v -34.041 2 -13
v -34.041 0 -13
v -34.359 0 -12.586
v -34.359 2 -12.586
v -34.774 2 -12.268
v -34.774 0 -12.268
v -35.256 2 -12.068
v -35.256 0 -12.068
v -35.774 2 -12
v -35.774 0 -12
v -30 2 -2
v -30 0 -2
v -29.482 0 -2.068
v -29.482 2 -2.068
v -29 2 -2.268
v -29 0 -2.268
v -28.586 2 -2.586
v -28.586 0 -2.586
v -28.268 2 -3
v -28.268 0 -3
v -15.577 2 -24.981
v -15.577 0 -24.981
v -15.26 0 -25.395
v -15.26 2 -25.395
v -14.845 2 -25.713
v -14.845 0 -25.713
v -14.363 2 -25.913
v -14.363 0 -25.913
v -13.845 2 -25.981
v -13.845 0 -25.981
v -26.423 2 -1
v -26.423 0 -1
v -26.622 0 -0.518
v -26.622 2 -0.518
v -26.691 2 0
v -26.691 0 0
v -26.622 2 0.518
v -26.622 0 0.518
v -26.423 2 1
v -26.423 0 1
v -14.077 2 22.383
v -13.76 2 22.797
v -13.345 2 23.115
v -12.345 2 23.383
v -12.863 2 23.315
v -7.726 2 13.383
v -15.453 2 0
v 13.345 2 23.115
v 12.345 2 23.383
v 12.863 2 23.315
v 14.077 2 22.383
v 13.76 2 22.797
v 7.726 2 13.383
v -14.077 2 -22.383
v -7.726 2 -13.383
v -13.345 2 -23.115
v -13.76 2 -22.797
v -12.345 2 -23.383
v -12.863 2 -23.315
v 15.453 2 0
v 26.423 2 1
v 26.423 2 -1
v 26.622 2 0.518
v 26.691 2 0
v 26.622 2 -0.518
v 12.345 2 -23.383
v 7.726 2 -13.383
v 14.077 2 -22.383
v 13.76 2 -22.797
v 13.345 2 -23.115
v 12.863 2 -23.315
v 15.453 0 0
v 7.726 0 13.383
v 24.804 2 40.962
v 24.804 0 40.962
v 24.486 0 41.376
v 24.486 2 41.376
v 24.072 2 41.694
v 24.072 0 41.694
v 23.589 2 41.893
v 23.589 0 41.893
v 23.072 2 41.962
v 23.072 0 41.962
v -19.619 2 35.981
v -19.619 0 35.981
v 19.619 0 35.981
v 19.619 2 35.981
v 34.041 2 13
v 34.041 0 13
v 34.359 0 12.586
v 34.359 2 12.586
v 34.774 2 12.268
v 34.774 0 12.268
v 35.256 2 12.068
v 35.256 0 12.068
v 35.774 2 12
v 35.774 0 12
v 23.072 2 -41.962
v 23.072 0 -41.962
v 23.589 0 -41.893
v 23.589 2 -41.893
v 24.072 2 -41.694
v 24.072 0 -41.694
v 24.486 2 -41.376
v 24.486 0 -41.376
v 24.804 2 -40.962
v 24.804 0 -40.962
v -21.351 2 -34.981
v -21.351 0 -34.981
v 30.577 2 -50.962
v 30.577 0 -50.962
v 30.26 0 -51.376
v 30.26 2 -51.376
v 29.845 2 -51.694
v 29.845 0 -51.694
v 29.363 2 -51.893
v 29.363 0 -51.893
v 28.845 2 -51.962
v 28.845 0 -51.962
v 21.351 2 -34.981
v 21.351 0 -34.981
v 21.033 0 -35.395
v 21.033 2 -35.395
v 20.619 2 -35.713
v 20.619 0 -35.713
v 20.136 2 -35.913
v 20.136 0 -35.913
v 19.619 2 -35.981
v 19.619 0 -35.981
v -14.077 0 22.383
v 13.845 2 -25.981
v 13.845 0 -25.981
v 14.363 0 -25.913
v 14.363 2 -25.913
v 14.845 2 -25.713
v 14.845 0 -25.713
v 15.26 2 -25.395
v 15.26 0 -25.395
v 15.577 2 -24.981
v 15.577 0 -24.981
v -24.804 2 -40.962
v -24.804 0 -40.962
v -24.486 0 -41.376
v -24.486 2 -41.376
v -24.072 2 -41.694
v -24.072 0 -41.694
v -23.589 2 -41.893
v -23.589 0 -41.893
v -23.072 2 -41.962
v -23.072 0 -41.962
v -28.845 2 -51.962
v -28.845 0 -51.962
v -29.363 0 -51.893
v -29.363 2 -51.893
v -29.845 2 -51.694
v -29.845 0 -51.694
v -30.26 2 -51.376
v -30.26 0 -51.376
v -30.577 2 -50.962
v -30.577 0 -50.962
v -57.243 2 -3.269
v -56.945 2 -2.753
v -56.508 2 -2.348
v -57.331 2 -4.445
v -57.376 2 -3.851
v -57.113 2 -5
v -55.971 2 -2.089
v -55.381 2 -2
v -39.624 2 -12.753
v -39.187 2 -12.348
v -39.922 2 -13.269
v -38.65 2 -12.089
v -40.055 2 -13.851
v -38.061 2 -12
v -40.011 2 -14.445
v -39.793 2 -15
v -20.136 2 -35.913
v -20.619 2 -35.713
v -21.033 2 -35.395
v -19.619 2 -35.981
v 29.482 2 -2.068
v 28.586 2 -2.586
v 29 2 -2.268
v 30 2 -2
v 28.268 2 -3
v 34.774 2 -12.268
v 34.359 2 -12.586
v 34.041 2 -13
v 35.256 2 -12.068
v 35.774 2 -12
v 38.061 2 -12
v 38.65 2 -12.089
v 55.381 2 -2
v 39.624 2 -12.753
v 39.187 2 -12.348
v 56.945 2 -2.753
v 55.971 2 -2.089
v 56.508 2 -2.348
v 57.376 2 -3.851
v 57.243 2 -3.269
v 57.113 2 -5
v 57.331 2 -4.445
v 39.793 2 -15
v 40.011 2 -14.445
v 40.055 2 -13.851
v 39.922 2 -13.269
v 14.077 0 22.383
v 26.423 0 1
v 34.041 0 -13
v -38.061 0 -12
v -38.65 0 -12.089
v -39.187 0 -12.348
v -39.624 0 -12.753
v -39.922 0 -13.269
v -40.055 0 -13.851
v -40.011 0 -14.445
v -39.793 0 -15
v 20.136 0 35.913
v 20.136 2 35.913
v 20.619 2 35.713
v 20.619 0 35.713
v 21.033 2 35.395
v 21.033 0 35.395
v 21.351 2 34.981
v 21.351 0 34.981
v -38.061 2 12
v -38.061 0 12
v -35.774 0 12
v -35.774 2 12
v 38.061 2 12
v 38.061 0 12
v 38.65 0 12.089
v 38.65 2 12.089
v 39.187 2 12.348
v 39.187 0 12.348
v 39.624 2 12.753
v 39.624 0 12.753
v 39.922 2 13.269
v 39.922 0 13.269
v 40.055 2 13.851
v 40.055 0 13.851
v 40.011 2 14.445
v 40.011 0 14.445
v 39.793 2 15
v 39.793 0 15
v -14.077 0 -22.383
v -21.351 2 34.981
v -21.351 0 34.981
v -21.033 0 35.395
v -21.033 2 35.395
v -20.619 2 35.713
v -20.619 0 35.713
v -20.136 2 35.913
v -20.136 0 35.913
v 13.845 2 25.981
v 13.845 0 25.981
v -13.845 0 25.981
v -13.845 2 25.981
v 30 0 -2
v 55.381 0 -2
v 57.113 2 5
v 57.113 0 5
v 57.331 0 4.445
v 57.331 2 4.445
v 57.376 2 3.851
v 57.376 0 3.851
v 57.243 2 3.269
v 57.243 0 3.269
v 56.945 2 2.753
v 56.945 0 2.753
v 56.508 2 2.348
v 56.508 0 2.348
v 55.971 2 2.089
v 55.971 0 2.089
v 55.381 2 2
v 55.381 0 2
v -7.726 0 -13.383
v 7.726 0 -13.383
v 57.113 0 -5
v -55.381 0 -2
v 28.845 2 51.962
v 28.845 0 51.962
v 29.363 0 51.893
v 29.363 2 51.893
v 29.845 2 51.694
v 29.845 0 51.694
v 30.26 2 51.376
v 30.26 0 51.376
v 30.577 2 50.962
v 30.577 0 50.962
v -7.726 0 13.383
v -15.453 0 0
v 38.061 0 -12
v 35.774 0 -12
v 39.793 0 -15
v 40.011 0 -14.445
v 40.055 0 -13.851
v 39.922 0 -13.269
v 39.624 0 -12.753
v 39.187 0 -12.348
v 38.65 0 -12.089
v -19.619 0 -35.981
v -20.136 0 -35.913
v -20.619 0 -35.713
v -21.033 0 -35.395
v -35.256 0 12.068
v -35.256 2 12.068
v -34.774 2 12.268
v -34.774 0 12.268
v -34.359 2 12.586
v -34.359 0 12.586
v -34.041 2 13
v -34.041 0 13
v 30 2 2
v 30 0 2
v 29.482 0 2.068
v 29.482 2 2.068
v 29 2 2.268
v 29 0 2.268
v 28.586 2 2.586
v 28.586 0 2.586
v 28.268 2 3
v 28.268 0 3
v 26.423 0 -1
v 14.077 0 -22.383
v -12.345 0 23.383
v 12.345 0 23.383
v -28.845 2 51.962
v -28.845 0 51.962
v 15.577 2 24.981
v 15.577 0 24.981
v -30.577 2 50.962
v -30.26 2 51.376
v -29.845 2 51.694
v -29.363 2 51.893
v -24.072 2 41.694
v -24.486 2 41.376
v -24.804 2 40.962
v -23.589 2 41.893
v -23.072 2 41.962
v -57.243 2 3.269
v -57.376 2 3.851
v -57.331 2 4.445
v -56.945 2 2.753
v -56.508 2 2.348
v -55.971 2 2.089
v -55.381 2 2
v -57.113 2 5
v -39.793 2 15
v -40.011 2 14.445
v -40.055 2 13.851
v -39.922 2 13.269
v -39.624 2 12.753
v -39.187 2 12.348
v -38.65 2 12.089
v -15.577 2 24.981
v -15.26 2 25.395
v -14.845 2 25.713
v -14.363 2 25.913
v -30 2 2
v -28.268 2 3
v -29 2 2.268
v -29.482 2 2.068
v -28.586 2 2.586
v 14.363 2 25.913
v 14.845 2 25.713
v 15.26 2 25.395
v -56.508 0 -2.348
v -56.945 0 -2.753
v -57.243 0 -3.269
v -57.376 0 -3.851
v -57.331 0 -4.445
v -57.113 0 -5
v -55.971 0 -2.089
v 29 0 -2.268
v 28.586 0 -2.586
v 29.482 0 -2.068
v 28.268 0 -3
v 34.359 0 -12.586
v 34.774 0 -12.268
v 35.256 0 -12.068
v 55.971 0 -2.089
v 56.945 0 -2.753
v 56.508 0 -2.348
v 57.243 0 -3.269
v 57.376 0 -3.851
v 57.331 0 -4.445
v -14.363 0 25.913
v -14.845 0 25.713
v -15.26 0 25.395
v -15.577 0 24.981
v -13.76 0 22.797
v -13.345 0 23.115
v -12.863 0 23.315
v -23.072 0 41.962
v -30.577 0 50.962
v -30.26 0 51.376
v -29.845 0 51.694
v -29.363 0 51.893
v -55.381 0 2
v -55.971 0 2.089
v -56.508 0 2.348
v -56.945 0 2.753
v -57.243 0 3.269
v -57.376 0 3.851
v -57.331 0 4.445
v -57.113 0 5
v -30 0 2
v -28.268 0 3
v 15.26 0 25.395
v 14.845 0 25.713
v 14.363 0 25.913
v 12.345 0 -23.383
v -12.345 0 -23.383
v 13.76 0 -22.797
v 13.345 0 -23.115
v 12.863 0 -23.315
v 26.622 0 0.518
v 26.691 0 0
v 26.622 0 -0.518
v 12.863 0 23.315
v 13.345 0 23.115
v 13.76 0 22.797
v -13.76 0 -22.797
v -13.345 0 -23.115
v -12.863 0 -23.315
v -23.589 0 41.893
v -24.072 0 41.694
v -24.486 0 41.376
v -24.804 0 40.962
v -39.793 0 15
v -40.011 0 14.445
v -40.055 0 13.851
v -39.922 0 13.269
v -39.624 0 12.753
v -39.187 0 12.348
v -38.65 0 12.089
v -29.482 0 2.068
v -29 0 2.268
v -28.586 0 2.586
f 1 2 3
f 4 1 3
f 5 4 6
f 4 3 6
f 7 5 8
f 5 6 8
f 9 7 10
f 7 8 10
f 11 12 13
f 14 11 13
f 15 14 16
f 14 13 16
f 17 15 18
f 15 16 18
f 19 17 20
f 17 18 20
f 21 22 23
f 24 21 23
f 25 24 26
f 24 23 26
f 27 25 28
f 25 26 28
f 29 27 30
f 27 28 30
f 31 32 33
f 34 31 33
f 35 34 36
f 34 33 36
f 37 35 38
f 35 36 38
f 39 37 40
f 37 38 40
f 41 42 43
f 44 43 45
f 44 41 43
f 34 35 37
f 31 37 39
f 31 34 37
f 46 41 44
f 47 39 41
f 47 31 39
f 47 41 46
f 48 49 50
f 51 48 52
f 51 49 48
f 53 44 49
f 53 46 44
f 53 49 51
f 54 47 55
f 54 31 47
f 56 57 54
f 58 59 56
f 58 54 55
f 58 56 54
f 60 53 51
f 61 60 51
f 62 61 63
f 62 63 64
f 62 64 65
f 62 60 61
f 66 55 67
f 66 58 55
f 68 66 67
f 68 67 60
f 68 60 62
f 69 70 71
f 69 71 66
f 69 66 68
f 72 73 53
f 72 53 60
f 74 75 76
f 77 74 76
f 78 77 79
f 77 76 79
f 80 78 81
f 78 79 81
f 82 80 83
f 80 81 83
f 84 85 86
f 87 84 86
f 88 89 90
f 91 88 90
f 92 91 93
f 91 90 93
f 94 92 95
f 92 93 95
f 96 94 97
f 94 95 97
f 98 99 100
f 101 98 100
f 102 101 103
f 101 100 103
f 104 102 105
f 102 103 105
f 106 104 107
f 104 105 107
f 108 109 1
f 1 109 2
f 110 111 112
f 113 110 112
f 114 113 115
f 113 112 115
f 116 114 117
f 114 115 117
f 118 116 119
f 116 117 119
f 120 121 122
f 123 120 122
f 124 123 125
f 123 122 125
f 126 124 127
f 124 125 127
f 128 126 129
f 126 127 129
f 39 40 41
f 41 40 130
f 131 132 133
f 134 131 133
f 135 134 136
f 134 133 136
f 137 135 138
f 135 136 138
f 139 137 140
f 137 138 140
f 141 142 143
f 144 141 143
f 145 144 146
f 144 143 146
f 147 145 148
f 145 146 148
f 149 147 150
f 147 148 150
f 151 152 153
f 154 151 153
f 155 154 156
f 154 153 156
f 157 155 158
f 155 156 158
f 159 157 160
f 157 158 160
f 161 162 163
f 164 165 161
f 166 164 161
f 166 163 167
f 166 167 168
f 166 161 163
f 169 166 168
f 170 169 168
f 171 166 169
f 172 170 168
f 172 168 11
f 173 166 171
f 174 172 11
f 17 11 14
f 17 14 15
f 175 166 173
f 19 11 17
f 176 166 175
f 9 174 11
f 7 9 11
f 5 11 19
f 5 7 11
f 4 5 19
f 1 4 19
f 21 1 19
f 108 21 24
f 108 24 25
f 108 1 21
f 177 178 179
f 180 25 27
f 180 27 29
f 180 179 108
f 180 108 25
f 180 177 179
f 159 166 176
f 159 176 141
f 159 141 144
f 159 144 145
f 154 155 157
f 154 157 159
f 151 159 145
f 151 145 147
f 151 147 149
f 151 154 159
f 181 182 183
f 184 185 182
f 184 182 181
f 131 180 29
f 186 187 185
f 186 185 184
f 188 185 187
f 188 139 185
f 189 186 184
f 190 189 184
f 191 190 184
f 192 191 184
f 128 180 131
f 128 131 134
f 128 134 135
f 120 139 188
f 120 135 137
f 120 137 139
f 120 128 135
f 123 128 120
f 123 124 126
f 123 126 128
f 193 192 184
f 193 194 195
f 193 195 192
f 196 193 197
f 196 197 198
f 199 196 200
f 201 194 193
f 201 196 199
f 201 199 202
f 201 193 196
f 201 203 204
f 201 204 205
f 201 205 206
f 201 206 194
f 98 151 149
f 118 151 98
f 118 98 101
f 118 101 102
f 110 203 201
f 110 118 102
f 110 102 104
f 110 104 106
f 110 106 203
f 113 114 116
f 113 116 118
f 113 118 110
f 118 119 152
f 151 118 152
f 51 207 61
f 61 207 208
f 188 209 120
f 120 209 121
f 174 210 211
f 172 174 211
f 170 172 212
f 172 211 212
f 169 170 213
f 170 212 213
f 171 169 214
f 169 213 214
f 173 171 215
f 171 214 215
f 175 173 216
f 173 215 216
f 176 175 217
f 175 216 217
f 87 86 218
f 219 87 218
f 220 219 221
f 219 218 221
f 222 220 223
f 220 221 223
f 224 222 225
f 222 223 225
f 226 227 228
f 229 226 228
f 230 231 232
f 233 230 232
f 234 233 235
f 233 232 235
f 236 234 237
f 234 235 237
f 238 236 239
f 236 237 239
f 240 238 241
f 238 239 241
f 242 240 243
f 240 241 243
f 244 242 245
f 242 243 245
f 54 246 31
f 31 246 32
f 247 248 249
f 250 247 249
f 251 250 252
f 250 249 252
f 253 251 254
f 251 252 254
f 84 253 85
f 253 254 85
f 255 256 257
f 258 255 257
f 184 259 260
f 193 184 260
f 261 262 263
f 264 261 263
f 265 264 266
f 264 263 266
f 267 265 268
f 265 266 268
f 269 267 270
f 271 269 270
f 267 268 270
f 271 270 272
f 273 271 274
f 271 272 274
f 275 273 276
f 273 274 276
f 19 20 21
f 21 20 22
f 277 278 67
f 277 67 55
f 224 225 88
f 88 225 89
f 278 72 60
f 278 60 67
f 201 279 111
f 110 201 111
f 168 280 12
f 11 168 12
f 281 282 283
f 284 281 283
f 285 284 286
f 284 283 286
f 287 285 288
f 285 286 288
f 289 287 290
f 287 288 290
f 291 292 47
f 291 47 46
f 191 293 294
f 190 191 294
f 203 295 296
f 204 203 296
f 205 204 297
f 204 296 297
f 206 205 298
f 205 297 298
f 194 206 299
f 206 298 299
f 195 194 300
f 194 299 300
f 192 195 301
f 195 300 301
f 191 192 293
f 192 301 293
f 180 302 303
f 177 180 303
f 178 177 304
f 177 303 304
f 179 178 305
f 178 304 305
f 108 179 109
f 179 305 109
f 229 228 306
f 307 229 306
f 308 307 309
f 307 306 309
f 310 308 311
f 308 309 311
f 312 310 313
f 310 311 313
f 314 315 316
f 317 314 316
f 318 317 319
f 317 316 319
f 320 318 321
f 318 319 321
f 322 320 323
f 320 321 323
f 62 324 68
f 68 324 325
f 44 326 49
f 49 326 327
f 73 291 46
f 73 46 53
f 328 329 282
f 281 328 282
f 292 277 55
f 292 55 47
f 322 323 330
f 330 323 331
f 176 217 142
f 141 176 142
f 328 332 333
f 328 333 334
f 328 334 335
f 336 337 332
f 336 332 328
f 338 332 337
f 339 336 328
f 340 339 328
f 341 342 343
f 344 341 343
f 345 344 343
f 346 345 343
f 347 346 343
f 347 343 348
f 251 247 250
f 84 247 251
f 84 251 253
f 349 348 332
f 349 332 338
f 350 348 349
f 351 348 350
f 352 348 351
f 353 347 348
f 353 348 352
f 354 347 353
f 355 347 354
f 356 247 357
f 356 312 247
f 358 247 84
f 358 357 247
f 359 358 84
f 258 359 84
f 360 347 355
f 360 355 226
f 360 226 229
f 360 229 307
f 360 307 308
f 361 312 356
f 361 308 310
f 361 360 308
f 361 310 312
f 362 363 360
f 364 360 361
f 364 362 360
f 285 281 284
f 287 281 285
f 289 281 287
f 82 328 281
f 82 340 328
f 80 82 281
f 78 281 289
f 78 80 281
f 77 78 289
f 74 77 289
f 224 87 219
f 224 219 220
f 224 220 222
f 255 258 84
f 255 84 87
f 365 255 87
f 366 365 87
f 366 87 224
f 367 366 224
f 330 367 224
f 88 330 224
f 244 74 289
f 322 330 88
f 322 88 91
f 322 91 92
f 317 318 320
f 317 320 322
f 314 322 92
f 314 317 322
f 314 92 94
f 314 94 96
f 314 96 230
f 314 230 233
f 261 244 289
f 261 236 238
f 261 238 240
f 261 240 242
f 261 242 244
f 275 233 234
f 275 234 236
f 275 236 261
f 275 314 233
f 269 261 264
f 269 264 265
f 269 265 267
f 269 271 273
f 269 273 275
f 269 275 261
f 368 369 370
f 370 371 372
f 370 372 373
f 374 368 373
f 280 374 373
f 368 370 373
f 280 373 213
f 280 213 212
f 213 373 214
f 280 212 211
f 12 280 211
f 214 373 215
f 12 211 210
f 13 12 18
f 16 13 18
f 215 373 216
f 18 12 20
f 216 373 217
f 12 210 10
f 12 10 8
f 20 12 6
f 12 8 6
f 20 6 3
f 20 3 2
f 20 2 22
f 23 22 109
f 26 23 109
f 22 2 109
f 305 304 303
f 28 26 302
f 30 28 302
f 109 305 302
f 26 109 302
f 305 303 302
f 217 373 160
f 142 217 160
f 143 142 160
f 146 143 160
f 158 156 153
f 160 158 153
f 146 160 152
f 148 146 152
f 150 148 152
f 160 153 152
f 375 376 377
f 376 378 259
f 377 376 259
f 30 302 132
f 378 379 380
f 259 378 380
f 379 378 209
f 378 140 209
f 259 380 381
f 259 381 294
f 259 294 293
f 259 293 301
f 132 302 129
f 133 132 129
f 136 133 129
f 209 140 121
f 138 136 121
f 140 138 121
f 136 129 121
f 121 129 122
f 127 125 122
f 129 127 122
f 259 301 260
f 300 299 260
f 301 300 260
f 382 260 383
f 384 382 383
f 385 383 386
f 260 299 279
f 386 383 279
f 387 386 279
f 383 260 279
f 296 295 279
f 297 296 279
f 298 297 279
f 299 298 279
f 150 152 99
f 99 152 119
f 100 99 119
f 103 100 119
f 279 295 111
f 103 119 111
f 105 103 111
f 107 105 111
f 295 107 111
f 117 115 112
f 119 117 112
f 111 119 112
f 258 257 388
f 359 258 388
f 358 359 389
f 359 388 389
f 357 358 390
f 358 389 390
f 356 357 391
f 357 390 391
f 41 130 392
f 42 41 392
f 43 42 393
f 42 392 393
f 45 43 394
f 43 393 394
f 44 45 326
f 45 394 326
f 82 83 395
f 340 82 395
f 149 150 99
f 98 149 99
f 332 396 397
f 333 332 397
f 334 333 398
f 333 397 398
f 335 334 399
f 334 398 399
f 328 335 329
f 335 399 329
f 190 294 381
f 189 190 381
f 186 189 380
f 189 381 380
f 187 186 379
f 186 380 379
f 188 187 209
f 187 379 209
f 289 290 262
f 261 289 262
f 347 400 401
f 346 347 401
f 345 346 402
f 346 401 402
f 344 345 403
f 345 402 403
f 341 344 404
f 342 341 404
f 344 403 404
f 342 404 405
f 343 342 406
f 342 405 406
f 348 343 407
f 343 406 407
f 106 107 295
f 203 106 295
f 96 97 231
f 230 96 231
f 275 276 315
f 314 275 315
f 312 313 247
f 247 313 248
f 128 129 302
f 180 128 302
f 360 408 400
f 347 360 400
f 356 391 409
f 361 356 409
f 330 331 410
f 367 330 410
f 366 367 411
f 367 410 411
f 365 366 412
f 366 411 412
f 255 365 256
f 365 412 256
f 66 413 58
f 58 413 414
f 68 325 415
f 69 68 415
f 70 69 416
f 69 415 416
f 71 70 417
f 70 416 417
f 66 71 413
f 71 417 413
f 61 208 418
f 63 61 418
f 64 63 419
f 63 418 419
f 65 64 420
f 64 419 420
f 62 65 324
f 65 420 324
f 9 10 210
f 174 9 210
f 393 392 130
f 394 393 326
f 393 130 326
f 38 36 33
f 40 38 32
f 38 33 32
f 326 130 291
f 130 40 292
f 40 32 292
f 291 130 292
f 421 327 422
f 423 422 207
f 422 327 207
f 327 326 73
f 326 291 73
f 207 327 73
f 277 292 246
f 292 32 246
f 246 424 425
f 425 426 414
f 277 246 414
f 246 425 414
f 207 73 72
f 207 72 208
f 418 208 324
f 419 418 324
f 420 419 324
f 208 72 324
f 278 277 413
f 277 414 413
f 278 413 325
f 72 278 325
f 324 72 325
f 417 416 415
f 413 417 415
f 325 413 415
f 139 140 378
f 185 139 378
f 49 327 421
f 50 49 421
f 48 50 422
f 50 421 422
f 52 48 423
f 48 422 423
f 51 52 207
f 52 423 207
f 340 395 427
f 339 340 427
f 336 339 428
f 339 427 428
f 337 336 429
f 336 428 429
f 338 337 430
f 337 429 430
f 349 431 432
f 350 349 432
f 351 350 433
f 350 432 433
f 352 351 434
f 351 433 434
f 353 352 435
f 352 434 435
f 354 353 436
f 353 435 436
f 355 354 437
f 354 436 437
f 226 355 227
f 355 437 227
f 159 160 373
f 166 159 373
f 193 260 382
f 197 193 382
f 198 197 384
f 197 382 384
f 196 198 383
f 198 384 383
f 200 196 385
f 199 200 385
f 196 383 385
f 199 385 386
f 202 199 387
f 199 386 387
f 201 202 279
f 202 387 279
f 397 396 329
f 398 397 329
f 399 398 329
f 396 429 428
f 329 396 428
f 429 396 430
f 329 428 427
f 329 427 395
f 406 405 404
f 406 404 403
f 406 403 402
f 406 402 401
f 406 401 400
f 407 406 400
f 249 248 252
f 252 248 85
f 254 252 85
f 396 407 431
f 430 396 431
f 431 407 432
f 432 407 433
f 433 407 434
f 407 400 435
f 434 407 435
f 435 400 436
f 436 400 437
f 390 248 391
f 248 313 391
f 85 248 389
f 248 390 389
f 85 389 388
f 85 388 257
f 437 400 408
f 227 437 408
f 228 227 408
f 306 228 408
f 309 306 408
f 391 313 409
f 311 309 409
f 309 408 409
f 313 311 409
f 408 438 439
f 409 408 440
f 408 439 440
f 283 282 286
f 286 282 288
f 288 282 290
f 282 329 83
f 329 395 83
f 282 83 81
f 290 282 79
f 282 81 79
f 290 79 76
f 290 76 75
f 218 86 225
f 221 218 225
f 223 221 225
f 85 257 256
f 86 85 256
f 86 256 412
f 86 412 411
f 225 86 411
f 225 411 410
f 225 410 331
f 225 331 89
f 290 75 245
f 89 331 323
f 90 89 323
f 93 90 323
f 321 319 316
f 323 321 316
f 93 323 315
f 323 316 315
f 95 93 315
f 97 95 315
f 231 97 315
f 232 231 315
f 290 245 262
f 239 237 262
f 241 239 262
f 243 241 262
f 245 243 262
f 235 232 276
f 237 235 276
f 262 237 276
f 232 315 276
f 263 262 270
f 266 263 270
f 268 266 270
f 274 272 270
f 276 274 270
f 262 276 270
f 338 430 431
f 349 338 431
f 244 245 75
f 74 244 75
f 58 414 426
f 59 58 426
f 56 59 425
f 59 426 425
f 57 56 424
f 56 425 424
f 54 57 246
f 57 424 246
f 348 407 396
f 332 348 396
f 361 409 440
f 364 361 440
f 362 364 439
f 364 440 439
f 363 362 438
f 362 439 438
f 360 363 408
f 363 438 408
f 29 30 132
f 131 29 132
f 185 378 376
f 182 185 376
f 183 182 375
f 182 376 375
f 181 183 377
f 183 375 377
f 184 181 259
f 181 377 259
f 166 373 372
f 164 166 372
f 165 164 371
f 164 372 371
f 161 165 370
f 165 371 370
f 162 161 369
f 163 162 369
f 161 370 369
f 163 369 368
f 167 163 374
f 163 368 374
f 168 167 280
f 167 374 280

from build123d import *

# Parameters (mm, degrees)
EXTRUDE_1_DEPTH   = 2
EXTRUDE_1_2_DEPTH = 2
EXTRUDE_2_DEPTH   = 2


with BuildPart() as part:
    # 草图1 → 凸台-拉伸1 (new body)
    with BuildSketch(Plane(origin=(0, 0, 0), x_dir=(1, 0, 0), z_dir=(0, 1, 0))):
        with BuildLine():
            Line((57.113248654, 5), (30.577350269, 50.961524227))
            ThreePointArc((30.577350269, 50.961524227), (29.845299462, 51.693575035), (28.845299462, 51.961524227))
            Line((28.845299462, 51.961524227), (-28.845299462, 51.961524227))
            ThreePointArc((-28.845299462, 51.961524227), (-29.845299462, 51.693575035), (-30.577350269, 50.961524227))
            Line((-30.577350269, 50.961524227), (-57.113248654, 5))
            ThreePointArc((-57.113248654, 5), (-57.113248654, 3), (-55.381197846, 2))
            Line((-55.381197846, 2), (-30, 2))
            ThreePointArc((-30, 2), (-29, 2.267949192), (-28.267949192, 3))
            Line((-28.267949192, 3), (-15.577350269, 24.980762114))
            ThreePointArc((-15.577350269, 24.980762114), (-14.845299462, 25.712812921), (-13.845299462, 25.980762114))
            Line((-13.845299462, 25.980762114), (13.845299462, 25.980762114))
            ThreePointArc((13.845299462, 25.980762114), (14.845299462, 25.712812921), (15.577350269, 24.980762114))
            Line((15.577350269, 24.980762114), (28.267949192, 3))
            ThreePointArc((28.267949192, 3), (29, 2.267949192), (30, 2))
            Line((30, 2), (55.381197846, 2))
            ThreePointArc((55.381197846, 2), (57.113248654, 3), (57.113248654, 5))
        make_face()
        with BuildLine():
            Line((-21.350852961, 34.980762114), (-34.041451884, 13))
            ThreePointArc((-34.041451884, 13), (-34.773502692, 12.267949192), (-35.773502692, 12))
            Line((-35.773502692, 12), (-38.060689771, 12))
            ThreePointArc((-38.060689771, 12), (-39.792740578, 13), (-39.792740578, 15))
            Line((-39.792740578, 15), (-24.803847577, 40.961524227))
            ThreePointArc((-24.803847577, 40.961524227), (-24.07179677, 41.693575035), (-23.07179677, 41.961524227))
            Line((-23.07179677, 41.961524227), (23.07179677, 41.961524227))
            ThreePointArc((23.07179677, 41.961524227), (24.07179677, 41.693575035), (24.803847577, 40.961524227))
            Line((24.803847577, 40.961524227), (39.792740578, 15))
            ThreePointArc((39.792740578, 15), (39.792740578, 13), (38.060689771, 12))
            Line((38.060689771, 12), (35.773502692, 12))
            ThreePointArc((35.773502692, 12), (34.773502692, 12.267949192), (34.041451884, 13))
            Line((34.041451884, 13), (21.350852961, 34.980762114))
            ThreePointArc((21.350852961, 34.980762114), (20.618802154, 35.712812921), (19.618802154, 35.980762114))
            Line((19.618802154, 35.980762114), (-19.618802154, 35.980762114))
            ThreePointArc((-19.618802154, 35.980762114), (-20.618802154, 35.712812921), (-21.350852961, 34.980762114))
        make_face(mode=Mode.SUBTRACT)
    extrude(amount=EXTRUDE_1_DEPTH)


with BuildPart() as body_2:
    # 草图1 → Extrude 1 2 (new body)
    with BuildSketch(Plane(origin=(0, 0, 0), x_dir=(1, 0, 0), z_dir=(0, 1, 0))):
        with BuildLine():
            Line((-57.113248654, -5), (-30.577350269, -50.961524227))
            ThreePointArc((-30.577350269, -50.961524227), (-29.845299462, -51.693575035), (-28.845299462, -51.961524227))
            Line((-28.845299462, -51.961524227), (28.845299462, -51.961524227))
            ThreePointArc((28.845299462, -51.961524227), (29.845299462, -51.693575035), (30.577350269, -50.961524227))
            Line((30.577350269, -50.961524227), (57.113248654, -5))
            ThreePointArc((57.113248654, -5), (57.113248654, -3), (55.381197846, -2))
            Line((55.381197846, -2), (30, -2))
            ThreePointArc((30, -2), (29, -2.267949192), (28.267949192, -3))
            Line((28.267949192, -3), (15.577350269, -24.980762114))
            ThreePointArc((15.577350269, -24.980762114), (14.845299462, -25.712812921), (13.845299462, -25.980762114))
            Line((13.845299462, -25.980762114), (-13.845299462, -25.980762114))
            ThreePointArc((-13.845299462, -25.980762114), (-14.845299462, -25.712812921), (-15.577350269, -24.980762114))
            Line((-15.577350269, -24.980762114), (-28.267949192, -3))
            ThreePointArc((-28.267949192, -3), (-29, -2.267949192), (-30, -2))
            Line((-30, -2), (-55.381197846, -2))
            ThreePointArc((-55.381197846, -2), (-57.113248654, -3), (-57.113248654, -5))
        make_face()
        with BuildLine():
            Line((35.773502692, -12), (38.060689771, -12))
            ThreePointArc((38.060689771, -12), (39.792740578, -13), (39.792740578, -15))
            Line((39.792740578, -15), (24.803847577, -40.961524227))
            ThreePointArc((24.803847577, -40.961524227), (24.07179677, -41.693575035), (23.07179677, -41.961524227))
            Line((23.07179677, -41.961524227), (-23.07179677, -41.961524227))
            ThreePointArc((-23.07179677, -41.961524227), (-24.07179677, -41.693575035), (-24.803847577, -40.961524227))
            Line((-24.803847577, -40.961524227), (-39.792740578, -15))
            ThreePointArc((-39.792740578, -15), (-39.792740578, -13), (-38.060689771, -12))
            Line((-38.060689771, -12), (-35.773502692, -12))
            ThreePointArc((-35.773502692, -12), (-34.773502692, -12.267949192), (-34.041451884, -13))
            Line((-34.041451884, -13), (-21.350852961, -34.980762114))
            ThreePointArc((-21.350852961, -34.980762114), (-20.618802154, -35.712812921), (-19.618802154, -35.980762114))
            Line((-19.618802154, -35.980762114), (19.618802154, -35.980762114))
            ThreePointArc((19.618802154, -35.980762114), (20.618802154, -35.712812921), (21.350852961, -34.980762114))
            Line((21.350852961, -34.980762114), (34.041451884, -13))
            ThreePointArc((34.041451884, -13), (34.773502692, -12.267949192), (35.773502692, -12))
        make_face(mode=Mode.SUBTRACT)
    extrude(amount=EXTRUDE_1_2_DEPTH)


with BuildPart() as body_3:
    # 草图2 → 凸台-拉伸2 (new body)
    with BuildSketch(Plane(origin=(0, 0, 0), x_dir=(1, 0, 0), z_dir=(0, 1, 0))):
        with BuildLine():
            Line((26.422649731, 1), (14.077350269, 22.382685902))
            ThreePointArc((14.077350269, 22.382685902), (13.345299462, 23.11473671), (12.345299462, 23.382685902))
            Line((12.345299462, 23.382685902), (-12.345299462, 23.382685902))
            ThreePointArc((-12.345299462, 23.382685902), (-13.345299462, 23.11473671), (-14.077350269, 22.382685902))
            Line((-14.077350269, 22.382685902), (-26.422649731, 1))
            ThreePointArc((-26.422649731, 1), (-26.690598923, 0), (-26.422649731, -1))
            Line((-26.422649731, -1), (-14.077350269, -22.382685902))
            ThreePointArc((-14.077350269, -22.382685902), (-13.345299462, -23.11473671), (-12.345299462, -23.382685902))
            Line((-12.345299462, -23.382685902), (12.345299462, -23.382685902))
            ThreePointArc((12.345299462, -23.382685902), (13.345299462, -23.11473671), (14.077350269, -22.382685902))
            Line((14.077350269, -22.382685902), (26.422649731, -1))
            ThreePointArc((26.422649731, -1), (26.690598923, 0), (26.422649731, 1))
        make_face()
        Polygon((15.452994616, 0), (7.726497308, 13.382685902), (-7.726497308, 13.382685902), (-15.452994616, 0), (-7.726497308, -13.382685902), (7.726497308, -13.382685902), align=None, mode=Mode.SUBTRACT)
    extrude(amount=EXTRUDE_2_DEPTH)


solid = Compound([part.part, body_2.part, body_3.part])
